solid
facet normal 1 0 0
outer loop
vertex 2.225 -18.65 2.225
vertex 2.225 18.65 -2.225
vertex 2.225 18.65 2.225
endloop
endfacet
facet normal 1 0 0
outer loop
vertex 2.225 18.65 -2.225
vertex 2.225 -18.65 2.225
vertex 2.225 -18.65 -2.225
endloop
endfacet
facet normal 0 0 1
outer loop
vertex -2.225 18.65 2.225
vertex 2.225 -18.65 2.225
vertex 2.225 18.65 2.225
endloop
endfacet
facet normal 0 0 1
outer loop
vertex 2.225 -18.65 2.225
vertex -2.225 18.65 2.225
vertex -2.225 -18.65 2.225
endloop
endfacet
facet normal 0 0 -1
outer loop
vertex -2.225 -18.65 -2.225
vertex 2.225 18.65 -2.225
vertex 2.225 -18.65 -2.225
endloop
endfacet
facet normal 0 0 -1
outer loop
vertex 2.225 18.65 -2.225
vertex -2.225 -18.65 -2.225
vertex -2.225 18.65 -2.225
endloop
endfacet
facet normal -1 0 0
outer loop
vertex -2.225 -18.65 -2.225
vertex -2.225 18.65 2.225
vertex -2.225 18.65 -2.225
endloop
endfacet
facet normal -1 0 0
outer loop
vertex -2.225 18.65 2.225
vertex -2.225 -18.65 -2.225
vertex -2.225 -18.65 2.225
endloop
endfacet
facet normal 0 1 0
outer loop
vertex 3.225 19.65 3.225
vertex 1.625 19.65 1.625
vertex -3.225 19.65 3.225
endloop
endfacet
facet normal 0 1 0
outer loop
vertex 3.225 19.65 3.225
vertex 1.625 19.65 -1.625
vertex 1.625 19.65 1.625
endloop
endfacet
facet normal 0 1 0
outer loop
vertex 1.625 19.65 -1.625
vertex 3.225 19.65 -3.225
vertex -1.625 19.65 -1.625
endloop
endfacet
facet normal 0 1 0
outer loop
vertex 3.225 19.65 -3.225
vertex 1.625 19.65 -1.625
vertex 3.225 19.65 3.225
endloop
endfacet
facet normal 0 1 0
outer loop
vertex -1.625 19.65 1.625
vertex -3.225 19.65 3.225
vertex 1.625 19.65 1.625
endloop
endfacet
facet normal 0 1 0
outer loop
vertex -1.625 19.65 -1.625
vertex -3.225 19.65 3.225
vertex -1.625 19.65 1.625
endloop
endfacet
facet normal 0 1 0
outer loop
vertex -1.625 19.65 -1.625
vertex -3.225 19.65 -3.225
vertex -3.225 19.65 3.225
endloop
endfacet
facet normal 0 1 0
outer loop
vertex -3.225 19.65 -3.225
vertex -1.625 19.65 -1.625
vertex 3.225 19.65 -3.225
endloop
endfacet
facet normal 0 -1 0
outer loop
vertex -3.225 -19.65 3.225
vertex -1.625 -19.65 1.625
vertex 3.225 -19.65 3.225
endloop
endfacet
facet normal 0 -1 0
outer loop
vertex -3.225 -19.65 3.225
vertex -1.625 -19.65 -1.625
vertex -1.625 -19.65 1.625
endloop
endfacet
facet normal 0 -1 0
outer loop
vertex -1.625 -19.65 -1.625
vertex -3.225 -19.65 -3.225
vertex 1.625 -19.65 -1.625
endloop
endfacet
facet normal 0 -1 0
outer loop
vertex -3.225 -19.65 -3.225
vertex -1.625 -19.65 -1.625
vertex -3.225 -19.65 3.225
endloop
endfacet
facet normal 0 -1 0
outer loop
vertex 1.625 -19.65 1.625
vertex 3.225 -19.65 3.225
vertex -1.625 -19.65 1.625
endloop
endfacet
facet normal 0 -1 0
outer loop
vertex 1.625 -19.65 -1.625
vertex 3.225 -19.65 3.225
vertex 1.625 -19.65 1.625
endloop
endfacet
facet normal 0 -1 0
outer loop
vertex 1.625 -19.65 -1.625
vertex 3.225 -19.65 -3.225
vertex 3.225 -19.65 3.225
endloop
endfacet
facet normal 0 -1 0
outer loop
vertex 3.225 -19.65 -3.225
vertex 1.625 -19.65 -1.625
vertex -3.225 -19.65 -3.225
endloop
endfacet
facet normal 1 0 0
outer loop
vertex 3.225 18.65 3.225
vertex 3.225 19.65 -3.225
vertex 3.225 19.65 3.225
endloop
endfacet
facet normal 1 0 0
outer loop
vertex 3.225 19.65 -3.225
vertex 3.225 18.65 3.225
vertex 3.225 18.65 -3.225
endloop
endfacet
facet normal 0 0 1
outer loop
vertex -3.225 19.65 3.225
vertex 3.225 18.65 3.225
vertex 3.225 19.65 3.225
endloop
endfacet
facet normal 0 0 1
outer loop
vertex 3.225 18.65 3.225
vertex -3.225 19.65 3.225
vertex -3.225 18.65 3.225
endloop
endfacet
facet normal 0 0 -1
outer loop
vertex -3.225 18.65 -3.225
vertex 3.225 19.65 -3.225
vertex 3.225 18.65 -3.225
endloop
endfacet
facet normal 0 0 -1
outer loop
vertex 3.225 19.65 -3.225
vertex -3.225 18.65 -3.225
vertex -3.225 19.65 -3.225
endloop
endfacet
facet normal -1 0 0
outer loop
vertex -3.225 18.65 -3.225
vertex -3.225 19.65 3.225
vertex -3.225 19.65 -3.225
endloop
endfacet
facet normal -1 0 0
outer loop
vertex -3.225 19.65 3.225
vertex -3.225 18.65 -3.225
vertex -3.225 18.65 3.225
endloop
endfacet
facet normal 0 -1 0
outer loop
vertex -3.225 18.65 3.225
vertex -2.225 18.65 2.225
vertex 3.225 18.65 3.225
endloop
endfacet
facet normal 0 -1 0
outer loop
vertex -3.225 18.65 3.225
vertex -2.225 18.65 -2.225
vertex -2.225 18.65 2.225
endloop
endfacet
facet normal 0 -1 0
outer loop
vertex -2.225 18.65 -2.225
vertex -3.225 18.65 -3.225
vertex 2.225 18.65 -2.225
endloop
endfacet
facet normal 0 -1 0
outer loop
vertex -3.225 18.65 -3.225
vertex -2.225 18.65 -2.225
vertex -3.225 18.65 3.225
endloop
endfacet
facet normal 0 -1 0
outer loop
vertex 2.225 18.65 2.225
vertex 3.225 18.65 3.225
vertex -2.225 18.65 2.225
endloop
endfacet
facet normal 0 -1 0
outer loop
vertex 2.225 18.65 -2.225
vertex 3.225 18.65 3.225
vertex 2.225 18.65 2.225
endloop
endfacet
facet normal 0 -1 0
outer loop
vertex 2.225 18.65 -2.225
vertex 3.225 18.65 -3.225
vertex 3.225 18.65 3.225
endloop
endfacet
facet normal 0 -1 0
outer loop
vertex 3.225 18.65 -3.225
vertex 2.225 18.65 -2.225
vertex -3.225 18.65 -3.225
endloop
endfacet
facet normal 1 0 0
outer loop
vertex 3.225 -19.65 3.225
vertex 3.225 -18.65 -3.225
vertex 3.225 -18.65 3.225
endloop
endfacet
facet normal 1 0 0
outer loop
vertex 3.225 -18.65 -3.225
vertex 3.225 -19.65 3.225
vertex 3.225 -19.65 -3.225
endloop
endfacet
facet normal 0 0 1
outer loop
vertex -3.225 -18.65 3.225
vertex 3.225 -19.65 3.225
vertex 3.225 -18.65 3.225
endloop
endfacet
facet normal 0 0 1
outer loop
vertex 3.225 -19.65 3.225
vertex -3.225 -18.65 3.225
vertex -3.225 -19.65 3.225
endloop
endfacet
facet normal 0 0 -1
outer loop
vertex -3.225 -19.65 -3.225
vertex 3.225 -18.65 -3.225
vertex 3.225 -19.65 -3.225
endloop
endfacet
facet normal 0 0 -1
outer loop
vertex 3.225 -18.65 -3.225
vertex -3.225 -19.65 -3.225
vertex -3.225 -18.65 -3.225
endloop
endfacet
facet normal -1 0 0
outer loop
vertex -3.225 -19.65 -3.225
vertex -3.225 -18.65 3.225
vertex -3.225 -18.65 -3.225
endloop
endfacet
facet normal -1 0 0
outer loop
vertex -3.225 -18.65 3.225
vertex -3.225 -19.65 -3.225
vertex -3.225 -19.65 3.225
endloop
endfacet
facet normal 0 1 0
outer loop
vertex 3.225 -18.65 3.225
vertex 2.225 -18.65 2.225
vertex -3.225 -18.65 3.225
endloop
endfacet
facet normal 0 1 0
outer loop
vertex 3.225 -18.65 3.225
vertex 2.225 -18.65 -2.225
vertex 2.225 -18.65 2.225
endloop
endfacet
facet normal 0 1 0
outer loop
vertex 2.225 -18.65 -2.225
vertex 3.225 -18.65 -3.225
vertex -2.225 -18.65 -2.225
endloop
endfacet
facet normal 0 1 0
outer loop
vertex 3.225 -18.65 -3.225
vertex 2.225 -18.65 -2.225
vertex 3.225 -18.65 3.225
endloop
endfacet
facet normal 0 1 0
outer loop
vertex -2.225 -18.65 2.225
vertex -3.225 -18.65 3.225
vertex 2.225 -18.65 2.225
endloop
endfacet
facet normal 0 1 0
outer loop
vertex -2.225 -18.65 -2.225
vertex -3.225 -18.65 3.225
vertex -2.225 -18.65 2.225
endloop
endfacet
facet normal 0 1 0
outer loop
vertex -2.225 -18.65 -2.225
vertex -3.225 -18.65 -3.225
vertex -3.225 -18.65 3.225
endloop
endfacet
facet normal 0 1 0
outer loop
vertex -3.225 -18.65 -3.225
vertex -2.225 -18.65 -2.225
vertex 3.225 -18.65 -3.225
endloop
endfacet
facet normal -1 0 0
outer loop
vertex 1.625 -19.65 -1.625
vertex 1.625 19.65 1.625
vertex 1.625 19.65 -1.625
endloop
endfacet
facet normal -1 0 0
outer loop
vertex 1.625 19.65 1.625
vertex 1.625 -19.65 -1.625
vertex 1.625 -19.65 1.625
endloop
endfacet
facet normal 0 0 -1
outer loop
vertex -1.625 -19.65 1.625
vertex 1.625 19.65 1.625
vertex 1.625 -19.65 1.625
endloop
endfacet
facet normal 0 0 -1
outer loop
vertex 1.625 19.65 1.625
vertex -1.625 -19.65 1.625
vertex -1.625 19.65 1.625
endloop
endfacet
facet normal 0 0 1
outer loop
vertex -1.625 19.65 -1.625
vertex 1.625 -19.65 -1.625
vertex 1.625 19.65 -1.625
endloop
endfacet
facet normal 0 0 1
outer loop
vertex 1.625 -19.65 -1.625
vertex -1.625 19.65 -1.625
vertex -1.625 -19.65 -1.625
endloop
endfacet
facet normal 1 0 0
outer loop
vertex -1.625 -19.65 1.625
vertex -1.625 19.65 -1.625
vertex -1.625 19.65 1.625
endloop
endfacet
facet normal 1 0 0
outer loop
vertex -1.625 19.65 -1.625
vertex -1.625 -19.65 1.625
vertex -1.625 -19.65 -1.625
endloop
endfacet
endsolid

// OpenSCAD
// Copyright: Jetty, 2015
// License: Creative Commons:  Attribution, Non-Commercial, Share-alike: CC BY-NC-SA

manifoldCorrection = 0.01;

// Print with longest dimensions parallel to the bed (with raft / support)

// Top down view, W, L, H
formerThickness			= 0.6;			// Make in multiple of layer thickness
formerInternalDimensions = [3.25, 38.1, 3.25];	// Make a multiple of layer thickness

flangeThickness			= 1;
flangeHeight				= 1;

formerIDimensions 		= [formerInternalDimensions[0],
						   formerInternalDimensions[1] + formerThickness * 2 + manifoldCorrection * 2,
						   formerInternalDimensions[2]];

formerExtenalDimensions  = [formerInternalDimensions[0] + formerThickness * 2,
						   formerInternalDimensions[1] + formerThickness * 2,
						   formerInternalDimensions[2] + formerThickness * 2];
flangeDimensions			= [formerExtenalDimensions[0] + flangeHeight * 2,
						   flangeThickness,
						   formerExtenalDimensions[2] + flangeHeight * 2];
flangeOffset				= [0, ( formerExtenalDimensions[1] - flangeThickness ) / 2, 0]; 

difference()
{
	union()
	{
		cube(formerExtenalDimensions, center=true);
		translate( flangeOffset )
			cube(flangeDimensions, center = true);
		translate( -flangeOffset )
			cube(flangeDimensions, center = true);
	}
	cube(formerIDimensions, center=true);
}
